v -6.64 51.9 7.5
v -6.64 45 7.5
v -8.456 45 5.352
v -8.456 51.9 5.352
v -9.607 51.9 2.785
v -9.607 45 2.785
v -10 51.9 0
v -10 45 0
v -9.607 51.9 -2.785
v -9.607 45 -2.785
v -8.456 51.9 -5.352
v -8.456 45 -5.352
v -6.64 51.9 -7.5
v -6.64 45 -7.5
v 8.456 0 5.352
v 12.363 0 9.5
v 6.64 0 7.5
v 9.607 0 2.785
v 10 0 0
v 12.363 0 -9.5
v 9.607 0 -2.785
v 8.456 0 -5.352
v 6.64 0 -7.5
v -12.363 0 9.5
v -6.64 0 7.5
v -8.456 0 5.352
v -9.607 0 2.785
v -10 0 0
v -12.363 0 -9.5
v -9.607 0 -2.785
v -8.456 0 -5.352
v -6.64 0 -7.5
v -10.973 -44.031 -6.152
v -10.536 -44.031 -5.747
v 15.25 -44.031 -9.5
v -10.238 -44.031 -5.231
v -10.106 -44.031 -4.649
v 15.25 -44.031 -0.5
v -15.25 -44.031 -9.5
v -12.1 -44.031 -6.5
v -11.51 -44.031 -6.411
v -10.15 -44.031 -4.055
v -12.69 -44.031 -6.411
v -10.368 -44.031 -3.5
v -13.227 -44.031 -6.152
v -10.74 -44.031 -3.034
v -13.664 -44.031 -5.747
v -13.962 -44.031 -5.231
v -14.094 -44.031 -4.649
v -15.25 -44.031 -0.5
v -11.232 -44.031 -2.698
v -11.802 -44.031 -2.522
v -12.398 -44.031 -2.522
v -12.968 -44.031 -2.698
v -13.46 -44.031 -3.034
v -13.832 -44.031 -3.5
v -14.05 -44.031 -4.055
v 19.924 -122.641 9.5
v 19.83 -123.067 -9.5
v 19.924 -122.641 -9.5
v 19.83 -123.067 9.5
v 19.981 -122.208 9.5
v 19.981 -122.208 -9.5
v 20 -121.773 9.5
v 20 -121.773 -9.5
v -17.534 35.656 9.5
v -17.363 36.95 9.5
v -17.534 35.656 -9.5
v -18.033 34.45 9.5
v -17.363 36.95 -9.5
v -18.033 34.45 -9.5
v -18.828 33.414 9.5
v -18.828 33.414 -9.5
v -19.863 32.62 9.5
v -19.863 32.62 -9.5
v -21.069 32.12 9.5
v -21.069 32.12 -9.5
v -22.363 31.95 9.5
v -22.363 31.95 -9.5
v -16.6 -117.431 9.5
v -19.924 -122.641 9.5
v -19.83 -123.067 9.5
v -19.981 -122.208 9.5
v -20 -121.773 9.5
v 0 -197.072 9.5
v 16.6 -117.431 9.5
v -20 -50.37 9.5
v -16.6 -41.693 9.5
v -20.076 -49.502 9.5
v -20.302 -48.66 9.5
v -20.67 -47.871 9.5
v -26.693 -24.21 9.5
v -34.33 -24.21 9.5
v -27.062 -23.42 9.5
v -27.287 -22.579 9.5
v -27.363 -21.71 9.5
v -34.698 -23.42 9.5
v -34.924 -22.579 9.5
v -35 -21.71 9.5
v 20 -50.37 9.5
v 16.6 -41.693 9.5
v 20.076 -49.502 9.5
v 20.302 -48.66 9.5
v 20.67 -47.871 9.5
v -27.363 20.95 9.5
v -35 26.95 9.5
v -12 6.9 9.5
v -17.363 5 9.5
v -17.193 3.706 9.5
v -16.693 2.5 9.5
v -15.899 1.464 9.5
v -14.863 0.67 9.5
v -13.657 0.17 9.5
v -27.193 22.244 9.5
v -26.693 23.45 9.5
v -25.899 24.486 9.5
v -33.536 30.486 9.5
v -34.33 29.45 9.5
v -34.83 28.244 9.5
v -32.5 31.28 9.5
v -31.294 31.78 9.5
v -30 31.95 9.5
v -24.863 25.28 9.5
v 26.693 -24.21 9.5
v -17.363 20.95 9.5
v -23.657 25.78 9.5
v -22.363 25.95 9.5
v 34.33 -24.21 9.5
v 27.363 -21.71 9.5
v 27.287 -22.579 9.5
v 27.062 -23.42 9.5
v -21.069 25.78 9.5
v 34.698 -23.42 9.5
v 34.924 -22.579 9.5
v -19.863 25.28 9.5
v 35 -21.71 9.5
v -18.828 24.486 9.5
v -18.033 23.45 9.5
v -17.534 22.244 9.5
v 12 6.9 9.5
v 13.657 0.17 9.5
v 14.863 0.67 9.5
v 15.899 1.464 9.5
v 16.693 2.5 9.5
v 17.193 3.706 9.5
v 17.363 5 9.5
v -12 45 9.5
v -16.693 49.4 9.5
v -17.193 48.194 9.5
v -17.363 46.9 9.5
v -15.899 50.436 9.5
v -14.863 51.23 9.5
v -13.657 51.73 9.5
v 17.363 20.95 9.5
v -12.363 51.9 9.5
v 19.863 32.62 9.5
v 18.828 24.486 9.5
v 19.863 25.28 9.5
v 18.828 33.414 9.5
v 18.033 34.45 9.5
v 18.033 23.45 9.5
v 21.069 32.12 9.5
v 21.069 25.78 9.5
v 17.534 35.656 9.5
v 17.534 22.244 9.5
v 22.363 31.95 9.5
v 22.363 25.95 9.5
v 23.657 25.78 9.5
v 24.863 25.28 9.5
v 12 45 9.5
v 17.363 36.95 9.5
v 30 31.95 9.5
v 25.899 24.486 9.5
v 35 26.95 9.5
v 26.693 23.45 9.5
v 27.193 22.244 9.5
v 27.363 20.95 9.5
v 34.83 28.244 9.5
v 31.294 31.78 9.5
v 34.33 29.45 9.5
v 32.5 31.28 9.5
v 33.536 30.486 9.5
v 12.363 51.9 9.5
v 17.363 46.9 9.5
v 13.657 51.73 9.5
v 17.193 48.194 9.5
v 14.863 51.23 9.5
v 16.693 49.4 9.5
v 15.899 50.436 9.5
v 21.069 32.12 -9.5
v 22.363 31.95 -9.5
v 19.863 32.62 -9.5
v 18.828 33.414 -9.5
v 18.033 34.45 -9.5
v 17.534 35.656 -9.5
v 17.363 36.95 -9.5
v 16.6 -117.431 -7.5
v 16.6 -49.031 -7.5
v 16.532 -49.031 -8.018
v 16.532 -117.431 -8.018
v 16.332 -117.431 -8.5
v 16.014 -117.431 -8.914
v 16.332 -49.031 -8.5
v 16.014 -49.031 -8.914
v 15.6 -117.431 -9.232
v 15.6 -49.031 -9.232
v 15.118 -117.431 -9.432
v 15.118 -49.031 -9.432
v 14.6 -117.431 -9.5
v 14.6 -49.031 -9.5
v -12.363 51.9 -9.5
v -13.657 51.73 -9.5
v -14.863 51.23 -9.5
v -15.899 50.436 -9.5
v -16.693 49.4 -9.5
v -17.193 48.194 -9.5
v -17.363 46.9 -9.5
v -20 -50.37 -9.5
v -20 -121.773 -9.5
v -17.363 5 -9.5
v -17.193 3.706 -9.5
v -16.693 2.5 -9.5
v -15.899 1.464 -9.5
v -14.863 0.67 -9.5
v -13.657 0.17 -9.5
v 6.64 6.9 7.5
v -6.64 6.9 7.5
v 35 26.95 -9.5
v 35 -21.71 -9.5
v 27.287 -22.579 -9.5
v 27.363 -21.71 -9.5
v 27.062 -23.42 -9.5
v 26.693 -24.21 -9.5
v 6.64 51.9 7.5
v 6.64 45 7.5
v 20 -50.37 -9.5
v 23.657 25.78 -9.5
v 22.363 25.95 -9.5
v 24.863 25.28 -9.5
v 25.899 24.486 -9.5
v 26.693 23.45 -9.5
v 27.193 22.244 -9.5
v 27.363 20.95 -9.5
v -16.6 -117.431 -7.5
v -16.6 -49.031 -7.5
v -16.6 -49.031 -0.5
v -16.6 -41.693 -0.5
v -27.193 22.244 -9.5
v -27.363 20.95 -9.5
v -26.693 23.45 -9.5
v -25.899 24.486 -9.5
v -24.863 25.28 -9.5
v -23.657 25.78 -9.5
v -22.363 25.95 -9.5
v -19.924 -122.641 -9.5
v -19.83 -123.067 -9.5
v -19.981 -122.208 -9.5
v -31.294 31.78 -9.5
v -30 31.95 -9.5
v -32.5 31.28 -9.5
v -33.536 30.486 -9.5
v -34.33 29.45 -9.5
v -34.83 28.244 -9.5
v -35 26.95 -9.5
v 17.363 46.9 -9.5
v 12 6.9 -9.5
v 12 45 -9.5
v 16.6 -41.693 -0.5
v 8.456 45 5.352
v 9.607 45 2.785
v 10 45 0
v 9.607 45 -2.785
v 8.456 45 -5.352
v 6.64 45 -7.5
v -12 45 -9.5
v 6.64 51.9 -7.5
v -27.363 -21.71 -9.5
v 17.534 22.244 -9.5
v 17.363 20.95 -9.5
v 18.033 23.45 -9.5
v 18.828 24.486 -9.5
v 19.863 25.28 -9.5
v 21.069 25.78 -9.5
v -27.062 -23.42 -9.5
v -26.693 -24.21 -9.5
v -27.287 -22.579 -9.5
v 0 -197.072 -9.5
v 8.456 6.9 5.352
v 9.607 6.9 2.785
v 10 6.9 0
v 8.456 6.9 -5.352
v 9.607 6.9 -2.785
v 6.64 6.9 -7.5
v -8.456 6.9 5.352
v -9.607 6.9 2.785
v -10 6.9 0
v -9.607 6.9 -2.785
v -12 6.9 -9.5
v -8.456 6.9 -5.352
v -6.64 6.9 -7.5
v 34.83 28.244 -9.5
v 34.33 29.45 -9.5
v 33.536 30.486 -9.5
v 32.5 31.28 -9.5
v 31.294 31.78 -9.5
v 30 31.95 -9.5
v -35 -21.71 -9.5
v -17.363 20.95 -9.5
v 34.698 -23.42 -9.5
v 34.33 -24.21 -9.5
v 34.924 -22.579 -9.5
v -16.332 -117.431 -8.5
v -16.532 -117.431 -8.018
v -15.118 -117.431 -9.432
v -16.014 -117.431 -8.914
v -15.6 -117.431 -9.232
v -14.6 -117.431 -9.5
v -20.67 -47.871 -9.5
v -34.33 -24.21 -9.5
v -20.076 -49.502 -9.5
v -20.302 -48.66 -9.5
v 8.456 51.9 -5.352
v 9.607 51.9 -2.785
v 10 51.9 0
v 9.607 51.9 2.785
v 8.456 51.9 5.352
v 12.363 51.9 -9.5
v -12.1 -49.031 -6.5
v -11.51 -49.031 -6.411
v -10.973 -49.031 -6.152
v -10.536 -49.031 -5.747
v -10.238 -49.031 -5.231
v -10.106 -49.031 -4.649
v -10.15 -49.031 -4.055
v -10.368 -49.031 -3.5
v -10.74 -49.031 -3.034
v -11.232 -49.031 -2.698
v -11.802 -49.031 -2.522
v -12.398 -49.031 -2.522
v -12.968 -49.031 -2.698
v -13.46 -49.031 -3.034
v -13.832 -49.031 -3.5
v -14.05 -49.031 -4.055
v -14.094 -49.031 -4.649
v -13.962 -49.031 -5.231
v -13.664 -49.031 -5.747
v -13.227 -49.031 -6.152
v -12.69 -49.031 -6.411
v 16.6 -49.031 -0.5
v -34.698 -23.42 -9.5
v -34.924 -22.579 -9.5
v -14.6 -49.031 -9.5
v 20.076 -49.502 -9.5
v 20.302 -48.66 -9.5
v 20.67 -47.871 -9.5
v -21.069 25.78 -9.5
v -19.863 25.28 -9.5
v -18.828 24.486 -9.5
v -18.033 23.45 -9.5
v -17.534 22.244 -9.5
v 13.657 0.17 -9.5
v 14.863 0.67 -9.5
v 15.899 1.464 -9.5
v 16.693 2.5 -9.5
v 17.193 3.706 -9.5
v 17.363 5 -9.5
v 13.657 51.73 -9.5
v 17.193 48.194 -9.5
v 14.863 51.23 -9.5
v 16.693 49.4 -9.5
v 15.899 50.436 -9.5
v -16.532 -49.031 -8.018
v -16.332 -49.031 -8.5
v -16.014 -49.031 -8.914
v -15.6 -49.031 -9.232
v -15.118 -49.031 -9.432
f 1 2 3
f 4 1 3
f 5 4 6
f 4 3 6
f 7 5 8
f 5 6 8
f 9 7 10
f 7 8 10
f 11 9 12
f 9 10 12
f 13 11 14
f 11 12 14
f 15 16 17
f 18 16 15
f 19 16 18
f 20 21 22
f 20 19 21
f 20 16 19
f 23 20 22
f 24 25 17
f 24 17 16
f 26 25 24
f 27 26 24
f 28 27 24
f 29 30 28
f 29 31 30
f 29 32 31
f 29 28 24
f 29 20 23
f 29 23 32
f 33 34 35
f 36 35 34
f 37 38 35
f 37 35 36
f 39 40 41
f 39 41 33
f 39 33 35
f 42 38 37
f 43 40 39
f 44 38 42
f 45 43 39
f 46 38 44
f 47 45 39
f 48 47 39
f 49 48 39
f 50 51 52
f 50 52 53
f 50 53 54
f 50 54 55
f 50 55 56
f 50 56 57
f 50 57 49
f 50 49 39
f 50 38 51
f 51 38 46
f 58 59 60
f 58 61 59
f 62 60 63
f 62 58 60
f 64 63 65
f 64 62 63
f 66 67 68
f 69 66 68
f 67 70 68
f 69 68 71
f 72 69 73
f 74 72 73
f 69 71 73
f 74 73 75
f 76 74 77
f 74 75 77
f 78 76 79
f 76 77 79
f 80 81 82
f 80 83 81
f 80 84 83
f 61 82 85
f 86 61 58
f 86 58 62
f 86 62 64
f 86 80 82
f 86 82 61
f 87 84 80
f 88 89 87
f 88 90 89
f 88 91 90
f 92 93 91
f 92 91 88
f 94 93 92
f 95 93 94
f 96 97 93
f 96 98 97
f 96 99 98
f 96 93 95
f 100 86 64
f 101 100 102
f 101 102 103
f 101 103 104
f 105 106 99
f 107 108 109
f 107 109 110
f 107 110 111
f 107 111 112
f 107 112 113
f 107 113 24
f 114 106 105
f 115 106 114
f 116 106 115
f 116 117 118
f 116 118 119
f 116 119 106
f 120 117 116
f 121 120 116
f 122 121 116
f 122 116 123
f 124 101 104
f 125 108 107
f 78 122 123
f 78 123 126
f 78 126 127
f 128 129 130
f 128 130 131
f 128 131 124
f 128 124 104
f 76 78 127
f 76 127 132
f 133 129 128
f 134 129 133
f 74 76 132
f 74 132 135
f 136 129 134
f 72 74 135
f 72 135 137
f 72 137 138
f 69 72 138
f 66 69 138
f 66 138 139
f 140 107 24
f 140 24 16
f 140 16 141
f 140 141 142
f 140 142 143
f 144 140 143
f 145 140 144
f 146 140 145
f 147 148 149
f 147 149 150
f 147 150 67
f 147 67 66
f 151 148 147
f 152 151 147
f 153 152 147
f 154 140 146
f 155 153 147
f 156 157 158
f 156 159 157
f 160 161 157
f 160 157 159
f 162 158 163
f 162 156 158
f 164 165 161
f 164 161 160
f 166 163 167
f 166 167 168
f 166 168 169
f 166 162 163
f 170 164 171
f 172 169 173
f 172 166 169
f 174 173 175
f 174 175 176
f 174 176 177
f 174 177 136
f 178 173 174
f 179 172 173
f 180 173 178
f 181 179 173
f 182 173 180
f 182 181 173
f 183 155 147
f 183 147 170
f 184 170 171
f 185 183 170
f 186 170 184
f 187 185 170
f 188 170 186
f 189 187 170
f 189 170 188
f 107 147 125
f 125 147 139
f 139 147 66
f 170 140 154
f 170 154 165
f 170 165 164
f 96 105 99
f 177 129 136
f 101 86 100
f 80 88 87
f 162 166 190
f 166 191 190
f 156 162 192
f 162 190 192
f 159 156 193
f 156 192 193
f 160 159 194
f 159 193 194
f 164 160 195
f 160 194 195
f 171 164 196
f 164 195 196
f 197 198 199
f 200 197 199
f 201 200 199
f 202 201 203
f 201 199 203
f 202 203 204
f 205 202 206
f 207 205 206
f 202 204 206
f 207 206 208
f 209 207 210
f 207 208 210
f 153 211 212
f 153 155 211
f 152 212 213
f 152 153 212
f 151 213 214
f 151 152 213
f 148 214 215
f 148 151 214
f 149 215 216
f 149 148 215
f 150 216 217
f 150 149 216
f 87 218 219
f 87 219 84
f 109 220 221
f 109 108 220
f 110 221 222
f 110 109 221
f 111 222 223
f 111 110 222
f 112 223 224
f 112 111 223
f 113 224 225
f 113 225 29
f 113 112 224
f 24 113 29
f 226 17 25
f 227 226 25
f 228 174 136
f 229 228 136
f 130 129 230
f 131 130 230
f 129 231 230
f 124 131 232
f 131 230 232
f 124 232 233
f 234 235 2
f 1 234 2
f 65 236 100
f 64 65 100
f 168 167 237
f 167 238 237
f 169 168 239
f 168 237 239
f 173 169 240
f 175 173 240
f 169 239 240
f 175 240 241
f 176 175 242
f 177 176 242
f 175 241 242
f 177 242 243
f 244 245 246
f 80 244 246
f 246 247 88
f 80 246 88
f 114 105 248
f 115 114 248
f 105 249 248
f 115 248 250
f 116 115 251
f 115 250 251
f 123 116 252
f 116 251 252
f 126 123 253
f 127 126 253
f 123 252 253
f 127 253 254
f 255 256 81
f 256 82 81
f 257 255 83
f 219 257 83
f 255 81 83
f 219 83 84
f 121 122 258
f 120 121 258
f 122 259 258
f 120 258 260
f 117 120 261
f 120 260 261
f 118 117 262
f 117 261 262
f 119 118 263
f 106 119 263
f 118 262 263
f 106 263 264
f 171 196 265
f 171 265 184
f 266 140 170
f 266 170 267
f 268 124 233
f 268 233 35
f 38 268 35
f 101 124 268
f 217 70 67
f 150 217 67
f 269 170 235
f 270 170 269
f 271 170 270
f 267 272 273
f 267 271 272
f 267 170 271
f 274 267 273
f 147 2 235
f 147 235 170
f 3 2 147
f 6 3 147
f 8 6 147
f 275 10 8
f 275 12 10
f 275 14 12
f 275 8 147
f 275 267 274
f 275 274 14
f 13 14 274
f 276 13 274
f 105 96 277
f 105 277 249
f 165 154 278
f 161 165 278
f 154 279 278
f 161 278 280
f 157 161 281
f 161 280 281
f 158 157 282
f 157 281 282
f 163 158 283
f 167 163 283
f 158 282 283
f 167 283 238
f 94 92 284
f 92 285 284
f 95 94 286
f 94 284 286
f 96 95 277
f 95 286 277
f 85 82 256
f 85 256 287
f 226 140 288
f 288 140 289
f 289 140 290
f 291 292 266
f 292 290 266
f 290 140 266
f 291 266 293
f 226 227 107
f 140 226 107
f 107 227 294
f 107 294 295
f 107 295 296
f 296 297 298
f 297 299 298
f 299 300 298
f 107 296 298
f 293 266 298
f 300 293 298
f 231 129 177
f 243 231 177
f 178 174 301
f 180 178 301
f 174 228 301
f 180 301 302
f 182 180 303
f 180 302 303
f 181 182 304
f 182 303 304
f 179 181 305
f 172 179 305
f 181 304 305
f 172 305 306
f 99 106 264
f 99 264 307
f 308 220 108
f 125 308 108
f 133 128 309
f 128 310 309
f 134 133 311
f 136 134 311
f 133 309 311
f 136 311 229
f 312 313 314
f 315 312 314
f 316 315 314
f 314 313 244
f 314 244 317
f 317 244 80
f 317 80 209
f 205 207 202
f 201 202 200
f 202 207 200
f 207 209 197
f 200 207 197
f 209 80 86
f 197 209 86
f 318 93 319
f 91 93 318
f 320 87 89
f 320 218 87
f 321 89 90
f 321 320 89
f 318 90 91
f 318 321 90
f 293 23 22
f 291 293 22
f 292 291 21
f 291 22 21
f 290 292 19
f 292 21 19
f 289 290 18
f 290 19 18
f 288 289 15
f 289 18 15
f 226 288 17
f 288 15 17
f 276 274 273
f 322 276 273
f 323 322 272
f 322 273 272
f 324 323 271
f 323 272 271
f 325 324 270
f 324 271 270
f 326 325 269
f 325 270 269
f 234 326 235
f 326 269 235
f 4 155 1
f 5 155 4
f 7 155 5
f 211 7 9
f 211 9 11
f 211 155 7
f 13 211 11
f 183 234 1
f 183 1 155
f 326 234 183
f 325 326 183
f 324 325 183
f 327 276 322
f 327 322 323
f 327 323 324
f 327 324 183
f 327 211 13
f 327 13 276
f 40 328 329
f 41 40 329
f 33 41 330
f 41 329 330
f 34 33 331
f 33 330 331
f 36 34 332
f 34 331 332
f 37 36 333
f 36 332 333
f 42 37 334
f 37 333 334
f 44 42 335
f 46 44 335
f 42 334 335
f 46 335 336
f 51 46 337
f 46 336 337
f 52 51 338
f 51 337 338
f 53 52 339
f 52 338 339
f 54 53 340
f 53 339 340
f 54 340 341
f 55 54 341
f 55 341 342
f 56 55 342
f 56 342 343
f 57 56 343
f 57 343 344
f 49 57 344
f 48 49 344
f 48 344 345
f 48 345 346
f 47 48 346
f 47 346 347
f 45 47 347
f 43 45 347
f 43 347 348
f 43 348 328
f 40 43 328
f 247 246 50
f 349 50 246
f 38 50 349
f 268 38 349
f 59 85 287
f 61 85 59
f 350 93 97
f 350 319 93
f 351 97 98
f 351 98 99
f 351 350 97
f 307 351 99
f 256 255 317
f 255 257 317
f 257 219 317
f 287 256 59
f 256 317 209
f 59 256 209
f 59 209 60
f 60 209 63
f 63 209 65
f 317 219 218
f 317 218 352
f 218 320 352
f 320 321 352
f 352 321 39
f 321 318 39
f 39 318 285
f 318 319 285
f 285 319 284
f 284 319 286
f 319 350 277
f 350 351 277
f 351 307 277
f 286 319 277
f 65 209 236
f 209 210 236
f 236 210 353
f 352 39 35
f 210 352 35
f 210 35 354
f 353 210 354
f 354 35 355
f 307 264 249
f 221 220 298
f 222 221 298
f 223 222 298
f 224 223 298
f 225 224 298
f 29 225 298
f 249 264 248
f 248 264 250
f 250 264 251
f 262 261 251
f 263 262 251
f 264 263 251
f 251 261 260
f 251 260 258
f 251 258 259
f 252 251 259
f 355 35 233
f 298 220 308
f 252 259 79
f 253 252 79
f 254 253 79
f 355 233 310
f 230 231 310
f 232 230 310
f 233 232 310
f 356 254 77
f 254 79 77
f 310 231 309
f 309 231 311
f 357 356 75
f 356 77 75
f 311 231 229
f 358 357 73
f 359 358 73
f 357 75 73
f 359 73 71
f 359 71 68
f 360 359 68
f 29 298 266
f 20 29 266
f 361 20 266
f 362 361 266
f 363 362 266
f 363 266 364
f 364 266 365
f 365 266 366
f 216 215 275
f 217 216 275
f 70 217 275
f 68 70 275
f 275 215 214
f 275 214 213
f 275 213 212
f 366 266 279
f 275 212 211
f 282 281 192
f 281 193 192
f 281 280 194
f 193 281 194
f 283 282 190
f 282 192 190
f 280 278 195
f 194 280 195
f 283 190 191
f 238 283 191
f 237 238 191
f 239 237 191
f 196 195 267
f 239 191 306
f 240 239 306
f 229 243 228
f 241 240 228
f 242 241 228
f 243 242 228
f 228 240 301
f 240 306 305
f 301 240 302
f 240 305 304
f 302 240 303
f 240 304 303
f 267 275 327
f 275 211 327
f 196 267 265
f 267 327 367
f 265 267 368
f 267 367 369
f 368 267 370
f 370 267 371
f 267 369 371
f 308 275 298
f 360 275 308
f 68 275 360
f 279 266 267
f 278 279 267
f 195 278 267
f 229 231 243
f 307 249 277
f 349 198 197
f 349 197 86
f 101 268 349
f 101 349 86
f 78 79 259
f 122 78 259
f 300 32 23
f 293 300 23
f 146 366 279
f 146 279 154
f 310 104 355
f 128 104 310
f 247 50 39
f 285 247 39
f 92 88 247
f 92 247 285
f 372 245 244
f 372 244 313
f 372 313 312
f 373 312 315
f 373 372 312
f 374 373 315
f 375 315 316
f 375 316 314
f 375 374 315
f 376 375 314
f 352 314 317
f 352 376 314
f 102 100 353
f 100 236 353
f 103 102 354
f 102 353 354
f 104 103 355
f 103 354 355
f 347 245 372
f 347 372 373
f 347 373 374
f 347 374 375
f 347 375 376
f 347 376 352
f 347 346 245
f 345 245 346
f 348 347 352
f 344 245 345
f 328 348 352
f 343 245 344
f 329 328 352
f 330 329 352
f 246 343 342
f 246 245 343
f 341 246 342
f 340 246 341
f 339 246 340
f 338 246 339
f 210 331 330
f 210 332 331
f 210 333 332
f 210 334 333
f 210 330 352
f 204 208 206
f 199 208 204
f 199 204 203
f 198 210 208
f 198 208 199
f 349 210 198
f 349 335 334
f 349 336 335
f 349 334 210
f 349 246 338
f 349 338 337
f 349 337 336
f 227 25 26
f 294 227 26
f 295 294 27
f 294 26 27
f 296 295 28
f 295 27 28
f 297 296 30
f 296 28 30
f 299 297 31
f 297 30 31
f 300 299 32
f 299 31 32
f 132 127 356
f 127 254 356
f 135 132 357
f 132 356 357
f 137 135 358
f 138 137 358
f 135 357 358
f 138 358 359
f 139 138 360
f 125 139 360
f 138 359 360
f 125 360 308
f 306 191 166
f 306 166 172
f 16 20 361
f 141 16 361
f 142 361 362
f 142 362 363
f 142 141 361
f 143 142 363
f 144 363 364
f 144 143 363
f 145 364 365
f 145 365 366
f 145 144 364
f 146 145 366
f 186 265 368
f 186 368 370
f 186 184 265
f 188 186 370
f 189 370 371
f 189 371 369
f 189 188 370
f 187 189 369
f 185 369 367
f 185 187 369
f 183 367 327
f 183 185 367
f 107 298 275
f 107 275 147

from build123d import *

# Parameters (mm, degrees)
BOSS_EXTRUDE1_DEPTH  = 6.9
BOSS_EXTRUDE2_START  = -6.9
BOSS_EXTRUDE2_DEPTH  = 51.9
CUT_EXTRUDE1_DEPTH   = 50.160278182
BOSS_EXTRUDE4_START  = -6.9
BOSS_EXTRUDE4_DEPTH  = 6.9
BOSS_EXTRUDE5_DEPTH  = 19
BOSS_EXTRUDE8_DEPTH  = 19
CUT_EXTRUDE2_DEPTH   = 38.1
SKETCH16_W           = 3.4
SKETCH16_H           = 19
BOSS_EXTRUDE10_DEPTH = 68.4
BOSS_EXTRUDE11_DEPTH = 68.4
SKETCH18_W           = 40
SKETCH18_H           = 19
BOSS_EXTRUDE12_DEPTH = 5
CUT_EXTRUDE3_START   = -7.338241
SKETCH20_W           = 33.2
SKETCH20_H           = 10
CUT_EXTRUDE3_DEPTH   = 7.338241
BOSS_EXTRUDE13_DEPTH = 19
FILLET1_R            = 5
SKETCH22_R           = 2
CUT_EXTRUDE4_DEPTH   = 49.030762114


with BuildPart() as part:
    # Sketch1 → Boss-Extrude1 (new body)
    with BuildSketch(Plane(origin=(0, 0, 0), x_dir=(1, 0, 0), z_dir=(0, 1, 0))):
        with BuildLine():
            ThreePointArc((7.36326441, 9.5), (12.000269064, 0), (7.36326441, -9.5))
            Line((7.36326441, -9.5), (0, -9.5))
            Line((0, -9.5), (-7.36326441, -9.5))
            ThreePointArc((-7.36326441, -9.5), (-12.000269064, 0), (-7.36326441, 9.5))
            Line((-7.36326441, 9.5), (0, 9.5))
            Line((0, 9.5), (7.36326441, 9.5))
        make_face()
        with BuildLine():
            Line((0, 7.5), (6.64, 7.5))
            ThreePointArc((6.64, 7.5), (10.000269064, 0), (6.64, -7.5))
            Line((6.64, -7.5), (0, -7.5))
            Line((0, -7.5), (-6.64, -7.5))
            ThreePointArc((-6.64, -7.5), (-10.000269064, 0), (-6.64, 7.5))
            Line((-6.64, 7.5), (0, 7.5))
        make_face(mode=Mode.SUBTRACT)
    extrude(amount=BOSS_EXTRUDE1_DEPTH)

    # Sketch2 → Boss-Extrude2 (add)
    with BuildSketch(Plane(origin=(0, 6.9, 0), x_dir=(1, 0, 0), z_dir=(0, 1, 0)).offset(BOSS_EXTRUDE2_START)):
        with BuildLine():
            Line((-7.36326441, 9.5), (-17.36326441, 9.5))
            Line((-17.36326441, 9.5), (-17.36326441, -9.5))
            Line((-17.36326441, -9.5), (-7.36326441, -9.5))
            ThreePointArc((-7.36326441, -9.5), (-12.000269064, 0), (-7.36326441, 9.5))
        make_face()
    boss_extrude2 = extrude(amount=BOSS_EXTRUDE2_DEPTH)

    # Sketch4 → Cut-Extrude1 (cut, through all)
    with BuildSketch(Plane(origin=(0, 6.9, 0), x_dir=(1, 0, 0), z_dir=(0, 1, 0))):
        with BuildLine():
            Line((-10.915369405, -4.996906494), (-8.86326441, -9.5))
            Line((-8.86326441, -9.5), (-7.36326441, -9.5))
            ThreePointArc((-7.36326441, -9.5), (-9.411139164, -7.462870557), (-10.915369405, -4.996906494))
        make_face()
        with BuildLine():
            Line((-10.915369405, 4.996906494), (-8.86326441, 9.5))
            Line((-8.86326441, 9.5), (-7.36326441, 9.5))
            ThreePointArc((-7.36326441, 9.5), (-9.411139164, 7.462870557), (-10.915369405, 4.996906494))
        make_face()
    cut_extrude1 = extrude(amount=CUT_EXTRUDE1_DEPTH, mode=Mode.SUBTRACT)

    # Mirror2: Boss-Extrude2, Cut-Extrude1 across plane
    add(boss_extrude2.mirror(Plane(origin=(0, 0, 0), x_dir=(0, 0, 1), z_dir=(1, 0, 0))))
    add(cut_extrude1.mirror(Plane(origin=(0, 0, 0), x_dir=(0, 0, 1), z_dir=(1, 0, 0))), mode=Mode.SUBTRACT)

    # Sketch6 → Boss-Extrude4 (add)
    with BuildSketch(Plane(origin=(0, 51.9, 0), x_dir=(1, 0, 0), z_dir=(0, 1, 0)).offset(BOSS_EXTRUDE4_START)):
        with BuildLine():
            Line((10.915369405, 4.996906494), (8.86326441, 9.5))
            Line((8.86326441, 9.5), (-8.86326441, 9.5))
            Line((-8.86326441, 9.5), (-10.915369405, 4.996906494))
            ThreePointArc((-10.915369405, 4.996906494), (-12.000269064, 0), (-10.915369405, -4.996906494))
            Line((-10.915369405, -4.996906494), (-8.86326441, -9.5))
            Line((-8.86326441, -9.5), (8.86326441, -9.5))
            Line((8.86326441, -9.5), (10.915369405, -4.996906494))
            ThreePointArc((10.915369405, -4.996906494), (12.000269064, 0), (10.915369405, 4.996906494))
        make_face()
        with BuildLine():
            Line((-6.64, 7.5), (6.64, 7.5))
            ThreePointArc((6.64, 7.5), (10.000269064, 0), (6.64, -7.5))
            Line((6.64, -7.5), (-6.64, -7.5))
            ThreePointArc((-6.64, -7.5), (-10.000269064, 0), (-6.64, 7.5))
        make_face(mode=Mode.SUBTRACT)
    extrude(amount=BOSS_EXTRUDE4_DEPTH)

    # Sketch7 → Boss-Extrude5 (add)
    with BuildSketch(Plane.XY.offset(9.5)):
        Polygon((-17.36326441, 31.95), (-35, 31.95), (-35, -23.05), (-27.36326441, -23.05), (-27.36326441, 25.95), (-17.36326441, 25.95), align=None)
    boss_extrude5 = extrude(amount=-BOSS_EXTRUDE5_DEPTH)

    # Mirror4: Boss-Extrude5 across plane
    add(boss_extrude5.mirror(Plane(origin=(0, 0, 0), x_dir=(0, 0, 1), z_dir=(1, 0, 0))))

    # Sketch11 → Boss-Extrude8 (add)
    with BuildSketch(Plane.XY.offset(9.5)):
        Polygon((-35, -23.05), (-20, -49.030762114), (20, -49.030762114), (35, -23.05), (27.36326441, -23.05), (15.250015756, -44.030762114), (-15.250015756, -44.030762114), (-27.36326441, -23.05), align=None)
    extrude(amount=-BOSS_EXTRUDE8_DEPTH)

    # Sketch15 → Cut-Extrude2 (cut)
    with BuildSketch(Plane(origin=(0, 6.9, 0), x_dir=(1, 0, 0), z_dir=(0, 1, 0))):
        Polygon((-12.000269064, 0), (-12.000269064, 9.5), (12.000269064, 9.5), (12.000269064, 0), (12.000269064, -9.5), (-12.000269064, -9.5), align=None)
    extrude(amount=CUT_EXTRUDE2_DEPTH, mode=Mode.SUBTRACT)

    # Sketch16 → Boss-Extrude10 (add)
    with BuildSketch(Plane.XZ.offset(49.030762114)):
        with Locations((-18.3, 0)):
            Rectangle(SKETCH16_W, SKETCH16_H)
        with Locations((18.3, 0)):
            Rectangle(SKETCH16_W, SKETCH16_H)
    extrude(amount=BOSS_EXTRUDE10_DEPTH)

    # Sketch17 → Boss-Extrude11 (add)
    with BuildSketch(Plane.XZ.offset(49.030762114)):
        with BuildLine():
            Line((-14.6, -9.5), (-16.6, -9.5))
            Line((-16.6, -9.5), (-16.6, -7.5))
            ThreePointArc((-16.6, -7.5), (-16.014213562, -8.914213562), (-14.6, -9.5))
        make_face()
        with BuildLine():
            Line((14.6, -9.5), (16.6, -9.5))
            Line((16.6, -9.5), (16.6, -7.5))
            ThreePointArc((16.6, -7.5), (16.014213562, -8.914213562), (14.6, -9.5))
        make_face()
    extrude(amount=BOSS_EXTRUDE11_DEPTH)

    # Sketch18 → Boss-Extrude12 (add)
    with BuildSketch(Plane.XZ.offset(117.430762114)):
        Rectangle(SKETCH18_W, SKETCH18_H)
    extrude(amount=BOSS_EXTRUDE12_DEPTH)

    # Sketch20 → Cut-Extrude3 (cut)
    with BuildSketch(Plane.XZ.offset(49.030762114).offset(CUT_EXTRUDE3_START)):
        with Locations((0, 4.5)):
            Rectangle(SKETCH20_W, SKETCH20_H)
    extrude(amount=CUT_EXTRUDE3_DEPTH, mode=Mode.SUBTRACT)

    # Sketch21 → Boss-Extrude13 (add)
    with BuildSketch(Plane.XY.offset(9.5)):
        Polygon((-20, -122.430762114), (0, -197.071778265), (20, -122.430762114), align=None)
    extrude(amount=-BOSS_EXTRUDE13_DEPTH)

    # Fillet1
    fillet1_edges = [part.edges().sort_by_distance(p)[0] for p in [
        (20, -122.430762114, 0),
        (20, -49.030762114, 0),
        (35, -23.05, 0),
        (35, 31.95, 0),
        (17.36326441, 31.95, 0),
        (-17.36326441, 31.95, 0),
        (-35, 31.95, 0),
        (-35, -23.05, 0),
        (-20, -49.030762114, 0),
        (-20, -122.430762114, 0),
        (-17.36326441, 0, 0),
        (17.36326441, 25.95, 0),
        (17.36326441, 0, 0),
        (17.36326441, 51.9, 0),
        (-17.36326441, 25.95, 0),
        (-17.36326441, 51.9, 0),
        (-27.36326441, -23.05, 0),
        (27.36326441, -23.05, 0),
        (27.36326441, 25.95, 0),
        (-27.36326441, 25.95, 0),
    ]]
    fillet(fillet1_edges, radius=FILLET1_R - 0.0001)  # a hair under: the kernel refuses the full size

    # Sketch22 → Cut-Extrude4 (cut)
    with BuildSketch(Plane.XZ.offset(49.030762114)):
        with Locations(Location((-12.1, -4.5, 0), (0, 0, 270))):
            Circle(SKETCH22_R)
    extrude(amount=-CUT_EXTRUDE4_DEPTH, mode=Mode.SUBTRACT)


solid = part.part
